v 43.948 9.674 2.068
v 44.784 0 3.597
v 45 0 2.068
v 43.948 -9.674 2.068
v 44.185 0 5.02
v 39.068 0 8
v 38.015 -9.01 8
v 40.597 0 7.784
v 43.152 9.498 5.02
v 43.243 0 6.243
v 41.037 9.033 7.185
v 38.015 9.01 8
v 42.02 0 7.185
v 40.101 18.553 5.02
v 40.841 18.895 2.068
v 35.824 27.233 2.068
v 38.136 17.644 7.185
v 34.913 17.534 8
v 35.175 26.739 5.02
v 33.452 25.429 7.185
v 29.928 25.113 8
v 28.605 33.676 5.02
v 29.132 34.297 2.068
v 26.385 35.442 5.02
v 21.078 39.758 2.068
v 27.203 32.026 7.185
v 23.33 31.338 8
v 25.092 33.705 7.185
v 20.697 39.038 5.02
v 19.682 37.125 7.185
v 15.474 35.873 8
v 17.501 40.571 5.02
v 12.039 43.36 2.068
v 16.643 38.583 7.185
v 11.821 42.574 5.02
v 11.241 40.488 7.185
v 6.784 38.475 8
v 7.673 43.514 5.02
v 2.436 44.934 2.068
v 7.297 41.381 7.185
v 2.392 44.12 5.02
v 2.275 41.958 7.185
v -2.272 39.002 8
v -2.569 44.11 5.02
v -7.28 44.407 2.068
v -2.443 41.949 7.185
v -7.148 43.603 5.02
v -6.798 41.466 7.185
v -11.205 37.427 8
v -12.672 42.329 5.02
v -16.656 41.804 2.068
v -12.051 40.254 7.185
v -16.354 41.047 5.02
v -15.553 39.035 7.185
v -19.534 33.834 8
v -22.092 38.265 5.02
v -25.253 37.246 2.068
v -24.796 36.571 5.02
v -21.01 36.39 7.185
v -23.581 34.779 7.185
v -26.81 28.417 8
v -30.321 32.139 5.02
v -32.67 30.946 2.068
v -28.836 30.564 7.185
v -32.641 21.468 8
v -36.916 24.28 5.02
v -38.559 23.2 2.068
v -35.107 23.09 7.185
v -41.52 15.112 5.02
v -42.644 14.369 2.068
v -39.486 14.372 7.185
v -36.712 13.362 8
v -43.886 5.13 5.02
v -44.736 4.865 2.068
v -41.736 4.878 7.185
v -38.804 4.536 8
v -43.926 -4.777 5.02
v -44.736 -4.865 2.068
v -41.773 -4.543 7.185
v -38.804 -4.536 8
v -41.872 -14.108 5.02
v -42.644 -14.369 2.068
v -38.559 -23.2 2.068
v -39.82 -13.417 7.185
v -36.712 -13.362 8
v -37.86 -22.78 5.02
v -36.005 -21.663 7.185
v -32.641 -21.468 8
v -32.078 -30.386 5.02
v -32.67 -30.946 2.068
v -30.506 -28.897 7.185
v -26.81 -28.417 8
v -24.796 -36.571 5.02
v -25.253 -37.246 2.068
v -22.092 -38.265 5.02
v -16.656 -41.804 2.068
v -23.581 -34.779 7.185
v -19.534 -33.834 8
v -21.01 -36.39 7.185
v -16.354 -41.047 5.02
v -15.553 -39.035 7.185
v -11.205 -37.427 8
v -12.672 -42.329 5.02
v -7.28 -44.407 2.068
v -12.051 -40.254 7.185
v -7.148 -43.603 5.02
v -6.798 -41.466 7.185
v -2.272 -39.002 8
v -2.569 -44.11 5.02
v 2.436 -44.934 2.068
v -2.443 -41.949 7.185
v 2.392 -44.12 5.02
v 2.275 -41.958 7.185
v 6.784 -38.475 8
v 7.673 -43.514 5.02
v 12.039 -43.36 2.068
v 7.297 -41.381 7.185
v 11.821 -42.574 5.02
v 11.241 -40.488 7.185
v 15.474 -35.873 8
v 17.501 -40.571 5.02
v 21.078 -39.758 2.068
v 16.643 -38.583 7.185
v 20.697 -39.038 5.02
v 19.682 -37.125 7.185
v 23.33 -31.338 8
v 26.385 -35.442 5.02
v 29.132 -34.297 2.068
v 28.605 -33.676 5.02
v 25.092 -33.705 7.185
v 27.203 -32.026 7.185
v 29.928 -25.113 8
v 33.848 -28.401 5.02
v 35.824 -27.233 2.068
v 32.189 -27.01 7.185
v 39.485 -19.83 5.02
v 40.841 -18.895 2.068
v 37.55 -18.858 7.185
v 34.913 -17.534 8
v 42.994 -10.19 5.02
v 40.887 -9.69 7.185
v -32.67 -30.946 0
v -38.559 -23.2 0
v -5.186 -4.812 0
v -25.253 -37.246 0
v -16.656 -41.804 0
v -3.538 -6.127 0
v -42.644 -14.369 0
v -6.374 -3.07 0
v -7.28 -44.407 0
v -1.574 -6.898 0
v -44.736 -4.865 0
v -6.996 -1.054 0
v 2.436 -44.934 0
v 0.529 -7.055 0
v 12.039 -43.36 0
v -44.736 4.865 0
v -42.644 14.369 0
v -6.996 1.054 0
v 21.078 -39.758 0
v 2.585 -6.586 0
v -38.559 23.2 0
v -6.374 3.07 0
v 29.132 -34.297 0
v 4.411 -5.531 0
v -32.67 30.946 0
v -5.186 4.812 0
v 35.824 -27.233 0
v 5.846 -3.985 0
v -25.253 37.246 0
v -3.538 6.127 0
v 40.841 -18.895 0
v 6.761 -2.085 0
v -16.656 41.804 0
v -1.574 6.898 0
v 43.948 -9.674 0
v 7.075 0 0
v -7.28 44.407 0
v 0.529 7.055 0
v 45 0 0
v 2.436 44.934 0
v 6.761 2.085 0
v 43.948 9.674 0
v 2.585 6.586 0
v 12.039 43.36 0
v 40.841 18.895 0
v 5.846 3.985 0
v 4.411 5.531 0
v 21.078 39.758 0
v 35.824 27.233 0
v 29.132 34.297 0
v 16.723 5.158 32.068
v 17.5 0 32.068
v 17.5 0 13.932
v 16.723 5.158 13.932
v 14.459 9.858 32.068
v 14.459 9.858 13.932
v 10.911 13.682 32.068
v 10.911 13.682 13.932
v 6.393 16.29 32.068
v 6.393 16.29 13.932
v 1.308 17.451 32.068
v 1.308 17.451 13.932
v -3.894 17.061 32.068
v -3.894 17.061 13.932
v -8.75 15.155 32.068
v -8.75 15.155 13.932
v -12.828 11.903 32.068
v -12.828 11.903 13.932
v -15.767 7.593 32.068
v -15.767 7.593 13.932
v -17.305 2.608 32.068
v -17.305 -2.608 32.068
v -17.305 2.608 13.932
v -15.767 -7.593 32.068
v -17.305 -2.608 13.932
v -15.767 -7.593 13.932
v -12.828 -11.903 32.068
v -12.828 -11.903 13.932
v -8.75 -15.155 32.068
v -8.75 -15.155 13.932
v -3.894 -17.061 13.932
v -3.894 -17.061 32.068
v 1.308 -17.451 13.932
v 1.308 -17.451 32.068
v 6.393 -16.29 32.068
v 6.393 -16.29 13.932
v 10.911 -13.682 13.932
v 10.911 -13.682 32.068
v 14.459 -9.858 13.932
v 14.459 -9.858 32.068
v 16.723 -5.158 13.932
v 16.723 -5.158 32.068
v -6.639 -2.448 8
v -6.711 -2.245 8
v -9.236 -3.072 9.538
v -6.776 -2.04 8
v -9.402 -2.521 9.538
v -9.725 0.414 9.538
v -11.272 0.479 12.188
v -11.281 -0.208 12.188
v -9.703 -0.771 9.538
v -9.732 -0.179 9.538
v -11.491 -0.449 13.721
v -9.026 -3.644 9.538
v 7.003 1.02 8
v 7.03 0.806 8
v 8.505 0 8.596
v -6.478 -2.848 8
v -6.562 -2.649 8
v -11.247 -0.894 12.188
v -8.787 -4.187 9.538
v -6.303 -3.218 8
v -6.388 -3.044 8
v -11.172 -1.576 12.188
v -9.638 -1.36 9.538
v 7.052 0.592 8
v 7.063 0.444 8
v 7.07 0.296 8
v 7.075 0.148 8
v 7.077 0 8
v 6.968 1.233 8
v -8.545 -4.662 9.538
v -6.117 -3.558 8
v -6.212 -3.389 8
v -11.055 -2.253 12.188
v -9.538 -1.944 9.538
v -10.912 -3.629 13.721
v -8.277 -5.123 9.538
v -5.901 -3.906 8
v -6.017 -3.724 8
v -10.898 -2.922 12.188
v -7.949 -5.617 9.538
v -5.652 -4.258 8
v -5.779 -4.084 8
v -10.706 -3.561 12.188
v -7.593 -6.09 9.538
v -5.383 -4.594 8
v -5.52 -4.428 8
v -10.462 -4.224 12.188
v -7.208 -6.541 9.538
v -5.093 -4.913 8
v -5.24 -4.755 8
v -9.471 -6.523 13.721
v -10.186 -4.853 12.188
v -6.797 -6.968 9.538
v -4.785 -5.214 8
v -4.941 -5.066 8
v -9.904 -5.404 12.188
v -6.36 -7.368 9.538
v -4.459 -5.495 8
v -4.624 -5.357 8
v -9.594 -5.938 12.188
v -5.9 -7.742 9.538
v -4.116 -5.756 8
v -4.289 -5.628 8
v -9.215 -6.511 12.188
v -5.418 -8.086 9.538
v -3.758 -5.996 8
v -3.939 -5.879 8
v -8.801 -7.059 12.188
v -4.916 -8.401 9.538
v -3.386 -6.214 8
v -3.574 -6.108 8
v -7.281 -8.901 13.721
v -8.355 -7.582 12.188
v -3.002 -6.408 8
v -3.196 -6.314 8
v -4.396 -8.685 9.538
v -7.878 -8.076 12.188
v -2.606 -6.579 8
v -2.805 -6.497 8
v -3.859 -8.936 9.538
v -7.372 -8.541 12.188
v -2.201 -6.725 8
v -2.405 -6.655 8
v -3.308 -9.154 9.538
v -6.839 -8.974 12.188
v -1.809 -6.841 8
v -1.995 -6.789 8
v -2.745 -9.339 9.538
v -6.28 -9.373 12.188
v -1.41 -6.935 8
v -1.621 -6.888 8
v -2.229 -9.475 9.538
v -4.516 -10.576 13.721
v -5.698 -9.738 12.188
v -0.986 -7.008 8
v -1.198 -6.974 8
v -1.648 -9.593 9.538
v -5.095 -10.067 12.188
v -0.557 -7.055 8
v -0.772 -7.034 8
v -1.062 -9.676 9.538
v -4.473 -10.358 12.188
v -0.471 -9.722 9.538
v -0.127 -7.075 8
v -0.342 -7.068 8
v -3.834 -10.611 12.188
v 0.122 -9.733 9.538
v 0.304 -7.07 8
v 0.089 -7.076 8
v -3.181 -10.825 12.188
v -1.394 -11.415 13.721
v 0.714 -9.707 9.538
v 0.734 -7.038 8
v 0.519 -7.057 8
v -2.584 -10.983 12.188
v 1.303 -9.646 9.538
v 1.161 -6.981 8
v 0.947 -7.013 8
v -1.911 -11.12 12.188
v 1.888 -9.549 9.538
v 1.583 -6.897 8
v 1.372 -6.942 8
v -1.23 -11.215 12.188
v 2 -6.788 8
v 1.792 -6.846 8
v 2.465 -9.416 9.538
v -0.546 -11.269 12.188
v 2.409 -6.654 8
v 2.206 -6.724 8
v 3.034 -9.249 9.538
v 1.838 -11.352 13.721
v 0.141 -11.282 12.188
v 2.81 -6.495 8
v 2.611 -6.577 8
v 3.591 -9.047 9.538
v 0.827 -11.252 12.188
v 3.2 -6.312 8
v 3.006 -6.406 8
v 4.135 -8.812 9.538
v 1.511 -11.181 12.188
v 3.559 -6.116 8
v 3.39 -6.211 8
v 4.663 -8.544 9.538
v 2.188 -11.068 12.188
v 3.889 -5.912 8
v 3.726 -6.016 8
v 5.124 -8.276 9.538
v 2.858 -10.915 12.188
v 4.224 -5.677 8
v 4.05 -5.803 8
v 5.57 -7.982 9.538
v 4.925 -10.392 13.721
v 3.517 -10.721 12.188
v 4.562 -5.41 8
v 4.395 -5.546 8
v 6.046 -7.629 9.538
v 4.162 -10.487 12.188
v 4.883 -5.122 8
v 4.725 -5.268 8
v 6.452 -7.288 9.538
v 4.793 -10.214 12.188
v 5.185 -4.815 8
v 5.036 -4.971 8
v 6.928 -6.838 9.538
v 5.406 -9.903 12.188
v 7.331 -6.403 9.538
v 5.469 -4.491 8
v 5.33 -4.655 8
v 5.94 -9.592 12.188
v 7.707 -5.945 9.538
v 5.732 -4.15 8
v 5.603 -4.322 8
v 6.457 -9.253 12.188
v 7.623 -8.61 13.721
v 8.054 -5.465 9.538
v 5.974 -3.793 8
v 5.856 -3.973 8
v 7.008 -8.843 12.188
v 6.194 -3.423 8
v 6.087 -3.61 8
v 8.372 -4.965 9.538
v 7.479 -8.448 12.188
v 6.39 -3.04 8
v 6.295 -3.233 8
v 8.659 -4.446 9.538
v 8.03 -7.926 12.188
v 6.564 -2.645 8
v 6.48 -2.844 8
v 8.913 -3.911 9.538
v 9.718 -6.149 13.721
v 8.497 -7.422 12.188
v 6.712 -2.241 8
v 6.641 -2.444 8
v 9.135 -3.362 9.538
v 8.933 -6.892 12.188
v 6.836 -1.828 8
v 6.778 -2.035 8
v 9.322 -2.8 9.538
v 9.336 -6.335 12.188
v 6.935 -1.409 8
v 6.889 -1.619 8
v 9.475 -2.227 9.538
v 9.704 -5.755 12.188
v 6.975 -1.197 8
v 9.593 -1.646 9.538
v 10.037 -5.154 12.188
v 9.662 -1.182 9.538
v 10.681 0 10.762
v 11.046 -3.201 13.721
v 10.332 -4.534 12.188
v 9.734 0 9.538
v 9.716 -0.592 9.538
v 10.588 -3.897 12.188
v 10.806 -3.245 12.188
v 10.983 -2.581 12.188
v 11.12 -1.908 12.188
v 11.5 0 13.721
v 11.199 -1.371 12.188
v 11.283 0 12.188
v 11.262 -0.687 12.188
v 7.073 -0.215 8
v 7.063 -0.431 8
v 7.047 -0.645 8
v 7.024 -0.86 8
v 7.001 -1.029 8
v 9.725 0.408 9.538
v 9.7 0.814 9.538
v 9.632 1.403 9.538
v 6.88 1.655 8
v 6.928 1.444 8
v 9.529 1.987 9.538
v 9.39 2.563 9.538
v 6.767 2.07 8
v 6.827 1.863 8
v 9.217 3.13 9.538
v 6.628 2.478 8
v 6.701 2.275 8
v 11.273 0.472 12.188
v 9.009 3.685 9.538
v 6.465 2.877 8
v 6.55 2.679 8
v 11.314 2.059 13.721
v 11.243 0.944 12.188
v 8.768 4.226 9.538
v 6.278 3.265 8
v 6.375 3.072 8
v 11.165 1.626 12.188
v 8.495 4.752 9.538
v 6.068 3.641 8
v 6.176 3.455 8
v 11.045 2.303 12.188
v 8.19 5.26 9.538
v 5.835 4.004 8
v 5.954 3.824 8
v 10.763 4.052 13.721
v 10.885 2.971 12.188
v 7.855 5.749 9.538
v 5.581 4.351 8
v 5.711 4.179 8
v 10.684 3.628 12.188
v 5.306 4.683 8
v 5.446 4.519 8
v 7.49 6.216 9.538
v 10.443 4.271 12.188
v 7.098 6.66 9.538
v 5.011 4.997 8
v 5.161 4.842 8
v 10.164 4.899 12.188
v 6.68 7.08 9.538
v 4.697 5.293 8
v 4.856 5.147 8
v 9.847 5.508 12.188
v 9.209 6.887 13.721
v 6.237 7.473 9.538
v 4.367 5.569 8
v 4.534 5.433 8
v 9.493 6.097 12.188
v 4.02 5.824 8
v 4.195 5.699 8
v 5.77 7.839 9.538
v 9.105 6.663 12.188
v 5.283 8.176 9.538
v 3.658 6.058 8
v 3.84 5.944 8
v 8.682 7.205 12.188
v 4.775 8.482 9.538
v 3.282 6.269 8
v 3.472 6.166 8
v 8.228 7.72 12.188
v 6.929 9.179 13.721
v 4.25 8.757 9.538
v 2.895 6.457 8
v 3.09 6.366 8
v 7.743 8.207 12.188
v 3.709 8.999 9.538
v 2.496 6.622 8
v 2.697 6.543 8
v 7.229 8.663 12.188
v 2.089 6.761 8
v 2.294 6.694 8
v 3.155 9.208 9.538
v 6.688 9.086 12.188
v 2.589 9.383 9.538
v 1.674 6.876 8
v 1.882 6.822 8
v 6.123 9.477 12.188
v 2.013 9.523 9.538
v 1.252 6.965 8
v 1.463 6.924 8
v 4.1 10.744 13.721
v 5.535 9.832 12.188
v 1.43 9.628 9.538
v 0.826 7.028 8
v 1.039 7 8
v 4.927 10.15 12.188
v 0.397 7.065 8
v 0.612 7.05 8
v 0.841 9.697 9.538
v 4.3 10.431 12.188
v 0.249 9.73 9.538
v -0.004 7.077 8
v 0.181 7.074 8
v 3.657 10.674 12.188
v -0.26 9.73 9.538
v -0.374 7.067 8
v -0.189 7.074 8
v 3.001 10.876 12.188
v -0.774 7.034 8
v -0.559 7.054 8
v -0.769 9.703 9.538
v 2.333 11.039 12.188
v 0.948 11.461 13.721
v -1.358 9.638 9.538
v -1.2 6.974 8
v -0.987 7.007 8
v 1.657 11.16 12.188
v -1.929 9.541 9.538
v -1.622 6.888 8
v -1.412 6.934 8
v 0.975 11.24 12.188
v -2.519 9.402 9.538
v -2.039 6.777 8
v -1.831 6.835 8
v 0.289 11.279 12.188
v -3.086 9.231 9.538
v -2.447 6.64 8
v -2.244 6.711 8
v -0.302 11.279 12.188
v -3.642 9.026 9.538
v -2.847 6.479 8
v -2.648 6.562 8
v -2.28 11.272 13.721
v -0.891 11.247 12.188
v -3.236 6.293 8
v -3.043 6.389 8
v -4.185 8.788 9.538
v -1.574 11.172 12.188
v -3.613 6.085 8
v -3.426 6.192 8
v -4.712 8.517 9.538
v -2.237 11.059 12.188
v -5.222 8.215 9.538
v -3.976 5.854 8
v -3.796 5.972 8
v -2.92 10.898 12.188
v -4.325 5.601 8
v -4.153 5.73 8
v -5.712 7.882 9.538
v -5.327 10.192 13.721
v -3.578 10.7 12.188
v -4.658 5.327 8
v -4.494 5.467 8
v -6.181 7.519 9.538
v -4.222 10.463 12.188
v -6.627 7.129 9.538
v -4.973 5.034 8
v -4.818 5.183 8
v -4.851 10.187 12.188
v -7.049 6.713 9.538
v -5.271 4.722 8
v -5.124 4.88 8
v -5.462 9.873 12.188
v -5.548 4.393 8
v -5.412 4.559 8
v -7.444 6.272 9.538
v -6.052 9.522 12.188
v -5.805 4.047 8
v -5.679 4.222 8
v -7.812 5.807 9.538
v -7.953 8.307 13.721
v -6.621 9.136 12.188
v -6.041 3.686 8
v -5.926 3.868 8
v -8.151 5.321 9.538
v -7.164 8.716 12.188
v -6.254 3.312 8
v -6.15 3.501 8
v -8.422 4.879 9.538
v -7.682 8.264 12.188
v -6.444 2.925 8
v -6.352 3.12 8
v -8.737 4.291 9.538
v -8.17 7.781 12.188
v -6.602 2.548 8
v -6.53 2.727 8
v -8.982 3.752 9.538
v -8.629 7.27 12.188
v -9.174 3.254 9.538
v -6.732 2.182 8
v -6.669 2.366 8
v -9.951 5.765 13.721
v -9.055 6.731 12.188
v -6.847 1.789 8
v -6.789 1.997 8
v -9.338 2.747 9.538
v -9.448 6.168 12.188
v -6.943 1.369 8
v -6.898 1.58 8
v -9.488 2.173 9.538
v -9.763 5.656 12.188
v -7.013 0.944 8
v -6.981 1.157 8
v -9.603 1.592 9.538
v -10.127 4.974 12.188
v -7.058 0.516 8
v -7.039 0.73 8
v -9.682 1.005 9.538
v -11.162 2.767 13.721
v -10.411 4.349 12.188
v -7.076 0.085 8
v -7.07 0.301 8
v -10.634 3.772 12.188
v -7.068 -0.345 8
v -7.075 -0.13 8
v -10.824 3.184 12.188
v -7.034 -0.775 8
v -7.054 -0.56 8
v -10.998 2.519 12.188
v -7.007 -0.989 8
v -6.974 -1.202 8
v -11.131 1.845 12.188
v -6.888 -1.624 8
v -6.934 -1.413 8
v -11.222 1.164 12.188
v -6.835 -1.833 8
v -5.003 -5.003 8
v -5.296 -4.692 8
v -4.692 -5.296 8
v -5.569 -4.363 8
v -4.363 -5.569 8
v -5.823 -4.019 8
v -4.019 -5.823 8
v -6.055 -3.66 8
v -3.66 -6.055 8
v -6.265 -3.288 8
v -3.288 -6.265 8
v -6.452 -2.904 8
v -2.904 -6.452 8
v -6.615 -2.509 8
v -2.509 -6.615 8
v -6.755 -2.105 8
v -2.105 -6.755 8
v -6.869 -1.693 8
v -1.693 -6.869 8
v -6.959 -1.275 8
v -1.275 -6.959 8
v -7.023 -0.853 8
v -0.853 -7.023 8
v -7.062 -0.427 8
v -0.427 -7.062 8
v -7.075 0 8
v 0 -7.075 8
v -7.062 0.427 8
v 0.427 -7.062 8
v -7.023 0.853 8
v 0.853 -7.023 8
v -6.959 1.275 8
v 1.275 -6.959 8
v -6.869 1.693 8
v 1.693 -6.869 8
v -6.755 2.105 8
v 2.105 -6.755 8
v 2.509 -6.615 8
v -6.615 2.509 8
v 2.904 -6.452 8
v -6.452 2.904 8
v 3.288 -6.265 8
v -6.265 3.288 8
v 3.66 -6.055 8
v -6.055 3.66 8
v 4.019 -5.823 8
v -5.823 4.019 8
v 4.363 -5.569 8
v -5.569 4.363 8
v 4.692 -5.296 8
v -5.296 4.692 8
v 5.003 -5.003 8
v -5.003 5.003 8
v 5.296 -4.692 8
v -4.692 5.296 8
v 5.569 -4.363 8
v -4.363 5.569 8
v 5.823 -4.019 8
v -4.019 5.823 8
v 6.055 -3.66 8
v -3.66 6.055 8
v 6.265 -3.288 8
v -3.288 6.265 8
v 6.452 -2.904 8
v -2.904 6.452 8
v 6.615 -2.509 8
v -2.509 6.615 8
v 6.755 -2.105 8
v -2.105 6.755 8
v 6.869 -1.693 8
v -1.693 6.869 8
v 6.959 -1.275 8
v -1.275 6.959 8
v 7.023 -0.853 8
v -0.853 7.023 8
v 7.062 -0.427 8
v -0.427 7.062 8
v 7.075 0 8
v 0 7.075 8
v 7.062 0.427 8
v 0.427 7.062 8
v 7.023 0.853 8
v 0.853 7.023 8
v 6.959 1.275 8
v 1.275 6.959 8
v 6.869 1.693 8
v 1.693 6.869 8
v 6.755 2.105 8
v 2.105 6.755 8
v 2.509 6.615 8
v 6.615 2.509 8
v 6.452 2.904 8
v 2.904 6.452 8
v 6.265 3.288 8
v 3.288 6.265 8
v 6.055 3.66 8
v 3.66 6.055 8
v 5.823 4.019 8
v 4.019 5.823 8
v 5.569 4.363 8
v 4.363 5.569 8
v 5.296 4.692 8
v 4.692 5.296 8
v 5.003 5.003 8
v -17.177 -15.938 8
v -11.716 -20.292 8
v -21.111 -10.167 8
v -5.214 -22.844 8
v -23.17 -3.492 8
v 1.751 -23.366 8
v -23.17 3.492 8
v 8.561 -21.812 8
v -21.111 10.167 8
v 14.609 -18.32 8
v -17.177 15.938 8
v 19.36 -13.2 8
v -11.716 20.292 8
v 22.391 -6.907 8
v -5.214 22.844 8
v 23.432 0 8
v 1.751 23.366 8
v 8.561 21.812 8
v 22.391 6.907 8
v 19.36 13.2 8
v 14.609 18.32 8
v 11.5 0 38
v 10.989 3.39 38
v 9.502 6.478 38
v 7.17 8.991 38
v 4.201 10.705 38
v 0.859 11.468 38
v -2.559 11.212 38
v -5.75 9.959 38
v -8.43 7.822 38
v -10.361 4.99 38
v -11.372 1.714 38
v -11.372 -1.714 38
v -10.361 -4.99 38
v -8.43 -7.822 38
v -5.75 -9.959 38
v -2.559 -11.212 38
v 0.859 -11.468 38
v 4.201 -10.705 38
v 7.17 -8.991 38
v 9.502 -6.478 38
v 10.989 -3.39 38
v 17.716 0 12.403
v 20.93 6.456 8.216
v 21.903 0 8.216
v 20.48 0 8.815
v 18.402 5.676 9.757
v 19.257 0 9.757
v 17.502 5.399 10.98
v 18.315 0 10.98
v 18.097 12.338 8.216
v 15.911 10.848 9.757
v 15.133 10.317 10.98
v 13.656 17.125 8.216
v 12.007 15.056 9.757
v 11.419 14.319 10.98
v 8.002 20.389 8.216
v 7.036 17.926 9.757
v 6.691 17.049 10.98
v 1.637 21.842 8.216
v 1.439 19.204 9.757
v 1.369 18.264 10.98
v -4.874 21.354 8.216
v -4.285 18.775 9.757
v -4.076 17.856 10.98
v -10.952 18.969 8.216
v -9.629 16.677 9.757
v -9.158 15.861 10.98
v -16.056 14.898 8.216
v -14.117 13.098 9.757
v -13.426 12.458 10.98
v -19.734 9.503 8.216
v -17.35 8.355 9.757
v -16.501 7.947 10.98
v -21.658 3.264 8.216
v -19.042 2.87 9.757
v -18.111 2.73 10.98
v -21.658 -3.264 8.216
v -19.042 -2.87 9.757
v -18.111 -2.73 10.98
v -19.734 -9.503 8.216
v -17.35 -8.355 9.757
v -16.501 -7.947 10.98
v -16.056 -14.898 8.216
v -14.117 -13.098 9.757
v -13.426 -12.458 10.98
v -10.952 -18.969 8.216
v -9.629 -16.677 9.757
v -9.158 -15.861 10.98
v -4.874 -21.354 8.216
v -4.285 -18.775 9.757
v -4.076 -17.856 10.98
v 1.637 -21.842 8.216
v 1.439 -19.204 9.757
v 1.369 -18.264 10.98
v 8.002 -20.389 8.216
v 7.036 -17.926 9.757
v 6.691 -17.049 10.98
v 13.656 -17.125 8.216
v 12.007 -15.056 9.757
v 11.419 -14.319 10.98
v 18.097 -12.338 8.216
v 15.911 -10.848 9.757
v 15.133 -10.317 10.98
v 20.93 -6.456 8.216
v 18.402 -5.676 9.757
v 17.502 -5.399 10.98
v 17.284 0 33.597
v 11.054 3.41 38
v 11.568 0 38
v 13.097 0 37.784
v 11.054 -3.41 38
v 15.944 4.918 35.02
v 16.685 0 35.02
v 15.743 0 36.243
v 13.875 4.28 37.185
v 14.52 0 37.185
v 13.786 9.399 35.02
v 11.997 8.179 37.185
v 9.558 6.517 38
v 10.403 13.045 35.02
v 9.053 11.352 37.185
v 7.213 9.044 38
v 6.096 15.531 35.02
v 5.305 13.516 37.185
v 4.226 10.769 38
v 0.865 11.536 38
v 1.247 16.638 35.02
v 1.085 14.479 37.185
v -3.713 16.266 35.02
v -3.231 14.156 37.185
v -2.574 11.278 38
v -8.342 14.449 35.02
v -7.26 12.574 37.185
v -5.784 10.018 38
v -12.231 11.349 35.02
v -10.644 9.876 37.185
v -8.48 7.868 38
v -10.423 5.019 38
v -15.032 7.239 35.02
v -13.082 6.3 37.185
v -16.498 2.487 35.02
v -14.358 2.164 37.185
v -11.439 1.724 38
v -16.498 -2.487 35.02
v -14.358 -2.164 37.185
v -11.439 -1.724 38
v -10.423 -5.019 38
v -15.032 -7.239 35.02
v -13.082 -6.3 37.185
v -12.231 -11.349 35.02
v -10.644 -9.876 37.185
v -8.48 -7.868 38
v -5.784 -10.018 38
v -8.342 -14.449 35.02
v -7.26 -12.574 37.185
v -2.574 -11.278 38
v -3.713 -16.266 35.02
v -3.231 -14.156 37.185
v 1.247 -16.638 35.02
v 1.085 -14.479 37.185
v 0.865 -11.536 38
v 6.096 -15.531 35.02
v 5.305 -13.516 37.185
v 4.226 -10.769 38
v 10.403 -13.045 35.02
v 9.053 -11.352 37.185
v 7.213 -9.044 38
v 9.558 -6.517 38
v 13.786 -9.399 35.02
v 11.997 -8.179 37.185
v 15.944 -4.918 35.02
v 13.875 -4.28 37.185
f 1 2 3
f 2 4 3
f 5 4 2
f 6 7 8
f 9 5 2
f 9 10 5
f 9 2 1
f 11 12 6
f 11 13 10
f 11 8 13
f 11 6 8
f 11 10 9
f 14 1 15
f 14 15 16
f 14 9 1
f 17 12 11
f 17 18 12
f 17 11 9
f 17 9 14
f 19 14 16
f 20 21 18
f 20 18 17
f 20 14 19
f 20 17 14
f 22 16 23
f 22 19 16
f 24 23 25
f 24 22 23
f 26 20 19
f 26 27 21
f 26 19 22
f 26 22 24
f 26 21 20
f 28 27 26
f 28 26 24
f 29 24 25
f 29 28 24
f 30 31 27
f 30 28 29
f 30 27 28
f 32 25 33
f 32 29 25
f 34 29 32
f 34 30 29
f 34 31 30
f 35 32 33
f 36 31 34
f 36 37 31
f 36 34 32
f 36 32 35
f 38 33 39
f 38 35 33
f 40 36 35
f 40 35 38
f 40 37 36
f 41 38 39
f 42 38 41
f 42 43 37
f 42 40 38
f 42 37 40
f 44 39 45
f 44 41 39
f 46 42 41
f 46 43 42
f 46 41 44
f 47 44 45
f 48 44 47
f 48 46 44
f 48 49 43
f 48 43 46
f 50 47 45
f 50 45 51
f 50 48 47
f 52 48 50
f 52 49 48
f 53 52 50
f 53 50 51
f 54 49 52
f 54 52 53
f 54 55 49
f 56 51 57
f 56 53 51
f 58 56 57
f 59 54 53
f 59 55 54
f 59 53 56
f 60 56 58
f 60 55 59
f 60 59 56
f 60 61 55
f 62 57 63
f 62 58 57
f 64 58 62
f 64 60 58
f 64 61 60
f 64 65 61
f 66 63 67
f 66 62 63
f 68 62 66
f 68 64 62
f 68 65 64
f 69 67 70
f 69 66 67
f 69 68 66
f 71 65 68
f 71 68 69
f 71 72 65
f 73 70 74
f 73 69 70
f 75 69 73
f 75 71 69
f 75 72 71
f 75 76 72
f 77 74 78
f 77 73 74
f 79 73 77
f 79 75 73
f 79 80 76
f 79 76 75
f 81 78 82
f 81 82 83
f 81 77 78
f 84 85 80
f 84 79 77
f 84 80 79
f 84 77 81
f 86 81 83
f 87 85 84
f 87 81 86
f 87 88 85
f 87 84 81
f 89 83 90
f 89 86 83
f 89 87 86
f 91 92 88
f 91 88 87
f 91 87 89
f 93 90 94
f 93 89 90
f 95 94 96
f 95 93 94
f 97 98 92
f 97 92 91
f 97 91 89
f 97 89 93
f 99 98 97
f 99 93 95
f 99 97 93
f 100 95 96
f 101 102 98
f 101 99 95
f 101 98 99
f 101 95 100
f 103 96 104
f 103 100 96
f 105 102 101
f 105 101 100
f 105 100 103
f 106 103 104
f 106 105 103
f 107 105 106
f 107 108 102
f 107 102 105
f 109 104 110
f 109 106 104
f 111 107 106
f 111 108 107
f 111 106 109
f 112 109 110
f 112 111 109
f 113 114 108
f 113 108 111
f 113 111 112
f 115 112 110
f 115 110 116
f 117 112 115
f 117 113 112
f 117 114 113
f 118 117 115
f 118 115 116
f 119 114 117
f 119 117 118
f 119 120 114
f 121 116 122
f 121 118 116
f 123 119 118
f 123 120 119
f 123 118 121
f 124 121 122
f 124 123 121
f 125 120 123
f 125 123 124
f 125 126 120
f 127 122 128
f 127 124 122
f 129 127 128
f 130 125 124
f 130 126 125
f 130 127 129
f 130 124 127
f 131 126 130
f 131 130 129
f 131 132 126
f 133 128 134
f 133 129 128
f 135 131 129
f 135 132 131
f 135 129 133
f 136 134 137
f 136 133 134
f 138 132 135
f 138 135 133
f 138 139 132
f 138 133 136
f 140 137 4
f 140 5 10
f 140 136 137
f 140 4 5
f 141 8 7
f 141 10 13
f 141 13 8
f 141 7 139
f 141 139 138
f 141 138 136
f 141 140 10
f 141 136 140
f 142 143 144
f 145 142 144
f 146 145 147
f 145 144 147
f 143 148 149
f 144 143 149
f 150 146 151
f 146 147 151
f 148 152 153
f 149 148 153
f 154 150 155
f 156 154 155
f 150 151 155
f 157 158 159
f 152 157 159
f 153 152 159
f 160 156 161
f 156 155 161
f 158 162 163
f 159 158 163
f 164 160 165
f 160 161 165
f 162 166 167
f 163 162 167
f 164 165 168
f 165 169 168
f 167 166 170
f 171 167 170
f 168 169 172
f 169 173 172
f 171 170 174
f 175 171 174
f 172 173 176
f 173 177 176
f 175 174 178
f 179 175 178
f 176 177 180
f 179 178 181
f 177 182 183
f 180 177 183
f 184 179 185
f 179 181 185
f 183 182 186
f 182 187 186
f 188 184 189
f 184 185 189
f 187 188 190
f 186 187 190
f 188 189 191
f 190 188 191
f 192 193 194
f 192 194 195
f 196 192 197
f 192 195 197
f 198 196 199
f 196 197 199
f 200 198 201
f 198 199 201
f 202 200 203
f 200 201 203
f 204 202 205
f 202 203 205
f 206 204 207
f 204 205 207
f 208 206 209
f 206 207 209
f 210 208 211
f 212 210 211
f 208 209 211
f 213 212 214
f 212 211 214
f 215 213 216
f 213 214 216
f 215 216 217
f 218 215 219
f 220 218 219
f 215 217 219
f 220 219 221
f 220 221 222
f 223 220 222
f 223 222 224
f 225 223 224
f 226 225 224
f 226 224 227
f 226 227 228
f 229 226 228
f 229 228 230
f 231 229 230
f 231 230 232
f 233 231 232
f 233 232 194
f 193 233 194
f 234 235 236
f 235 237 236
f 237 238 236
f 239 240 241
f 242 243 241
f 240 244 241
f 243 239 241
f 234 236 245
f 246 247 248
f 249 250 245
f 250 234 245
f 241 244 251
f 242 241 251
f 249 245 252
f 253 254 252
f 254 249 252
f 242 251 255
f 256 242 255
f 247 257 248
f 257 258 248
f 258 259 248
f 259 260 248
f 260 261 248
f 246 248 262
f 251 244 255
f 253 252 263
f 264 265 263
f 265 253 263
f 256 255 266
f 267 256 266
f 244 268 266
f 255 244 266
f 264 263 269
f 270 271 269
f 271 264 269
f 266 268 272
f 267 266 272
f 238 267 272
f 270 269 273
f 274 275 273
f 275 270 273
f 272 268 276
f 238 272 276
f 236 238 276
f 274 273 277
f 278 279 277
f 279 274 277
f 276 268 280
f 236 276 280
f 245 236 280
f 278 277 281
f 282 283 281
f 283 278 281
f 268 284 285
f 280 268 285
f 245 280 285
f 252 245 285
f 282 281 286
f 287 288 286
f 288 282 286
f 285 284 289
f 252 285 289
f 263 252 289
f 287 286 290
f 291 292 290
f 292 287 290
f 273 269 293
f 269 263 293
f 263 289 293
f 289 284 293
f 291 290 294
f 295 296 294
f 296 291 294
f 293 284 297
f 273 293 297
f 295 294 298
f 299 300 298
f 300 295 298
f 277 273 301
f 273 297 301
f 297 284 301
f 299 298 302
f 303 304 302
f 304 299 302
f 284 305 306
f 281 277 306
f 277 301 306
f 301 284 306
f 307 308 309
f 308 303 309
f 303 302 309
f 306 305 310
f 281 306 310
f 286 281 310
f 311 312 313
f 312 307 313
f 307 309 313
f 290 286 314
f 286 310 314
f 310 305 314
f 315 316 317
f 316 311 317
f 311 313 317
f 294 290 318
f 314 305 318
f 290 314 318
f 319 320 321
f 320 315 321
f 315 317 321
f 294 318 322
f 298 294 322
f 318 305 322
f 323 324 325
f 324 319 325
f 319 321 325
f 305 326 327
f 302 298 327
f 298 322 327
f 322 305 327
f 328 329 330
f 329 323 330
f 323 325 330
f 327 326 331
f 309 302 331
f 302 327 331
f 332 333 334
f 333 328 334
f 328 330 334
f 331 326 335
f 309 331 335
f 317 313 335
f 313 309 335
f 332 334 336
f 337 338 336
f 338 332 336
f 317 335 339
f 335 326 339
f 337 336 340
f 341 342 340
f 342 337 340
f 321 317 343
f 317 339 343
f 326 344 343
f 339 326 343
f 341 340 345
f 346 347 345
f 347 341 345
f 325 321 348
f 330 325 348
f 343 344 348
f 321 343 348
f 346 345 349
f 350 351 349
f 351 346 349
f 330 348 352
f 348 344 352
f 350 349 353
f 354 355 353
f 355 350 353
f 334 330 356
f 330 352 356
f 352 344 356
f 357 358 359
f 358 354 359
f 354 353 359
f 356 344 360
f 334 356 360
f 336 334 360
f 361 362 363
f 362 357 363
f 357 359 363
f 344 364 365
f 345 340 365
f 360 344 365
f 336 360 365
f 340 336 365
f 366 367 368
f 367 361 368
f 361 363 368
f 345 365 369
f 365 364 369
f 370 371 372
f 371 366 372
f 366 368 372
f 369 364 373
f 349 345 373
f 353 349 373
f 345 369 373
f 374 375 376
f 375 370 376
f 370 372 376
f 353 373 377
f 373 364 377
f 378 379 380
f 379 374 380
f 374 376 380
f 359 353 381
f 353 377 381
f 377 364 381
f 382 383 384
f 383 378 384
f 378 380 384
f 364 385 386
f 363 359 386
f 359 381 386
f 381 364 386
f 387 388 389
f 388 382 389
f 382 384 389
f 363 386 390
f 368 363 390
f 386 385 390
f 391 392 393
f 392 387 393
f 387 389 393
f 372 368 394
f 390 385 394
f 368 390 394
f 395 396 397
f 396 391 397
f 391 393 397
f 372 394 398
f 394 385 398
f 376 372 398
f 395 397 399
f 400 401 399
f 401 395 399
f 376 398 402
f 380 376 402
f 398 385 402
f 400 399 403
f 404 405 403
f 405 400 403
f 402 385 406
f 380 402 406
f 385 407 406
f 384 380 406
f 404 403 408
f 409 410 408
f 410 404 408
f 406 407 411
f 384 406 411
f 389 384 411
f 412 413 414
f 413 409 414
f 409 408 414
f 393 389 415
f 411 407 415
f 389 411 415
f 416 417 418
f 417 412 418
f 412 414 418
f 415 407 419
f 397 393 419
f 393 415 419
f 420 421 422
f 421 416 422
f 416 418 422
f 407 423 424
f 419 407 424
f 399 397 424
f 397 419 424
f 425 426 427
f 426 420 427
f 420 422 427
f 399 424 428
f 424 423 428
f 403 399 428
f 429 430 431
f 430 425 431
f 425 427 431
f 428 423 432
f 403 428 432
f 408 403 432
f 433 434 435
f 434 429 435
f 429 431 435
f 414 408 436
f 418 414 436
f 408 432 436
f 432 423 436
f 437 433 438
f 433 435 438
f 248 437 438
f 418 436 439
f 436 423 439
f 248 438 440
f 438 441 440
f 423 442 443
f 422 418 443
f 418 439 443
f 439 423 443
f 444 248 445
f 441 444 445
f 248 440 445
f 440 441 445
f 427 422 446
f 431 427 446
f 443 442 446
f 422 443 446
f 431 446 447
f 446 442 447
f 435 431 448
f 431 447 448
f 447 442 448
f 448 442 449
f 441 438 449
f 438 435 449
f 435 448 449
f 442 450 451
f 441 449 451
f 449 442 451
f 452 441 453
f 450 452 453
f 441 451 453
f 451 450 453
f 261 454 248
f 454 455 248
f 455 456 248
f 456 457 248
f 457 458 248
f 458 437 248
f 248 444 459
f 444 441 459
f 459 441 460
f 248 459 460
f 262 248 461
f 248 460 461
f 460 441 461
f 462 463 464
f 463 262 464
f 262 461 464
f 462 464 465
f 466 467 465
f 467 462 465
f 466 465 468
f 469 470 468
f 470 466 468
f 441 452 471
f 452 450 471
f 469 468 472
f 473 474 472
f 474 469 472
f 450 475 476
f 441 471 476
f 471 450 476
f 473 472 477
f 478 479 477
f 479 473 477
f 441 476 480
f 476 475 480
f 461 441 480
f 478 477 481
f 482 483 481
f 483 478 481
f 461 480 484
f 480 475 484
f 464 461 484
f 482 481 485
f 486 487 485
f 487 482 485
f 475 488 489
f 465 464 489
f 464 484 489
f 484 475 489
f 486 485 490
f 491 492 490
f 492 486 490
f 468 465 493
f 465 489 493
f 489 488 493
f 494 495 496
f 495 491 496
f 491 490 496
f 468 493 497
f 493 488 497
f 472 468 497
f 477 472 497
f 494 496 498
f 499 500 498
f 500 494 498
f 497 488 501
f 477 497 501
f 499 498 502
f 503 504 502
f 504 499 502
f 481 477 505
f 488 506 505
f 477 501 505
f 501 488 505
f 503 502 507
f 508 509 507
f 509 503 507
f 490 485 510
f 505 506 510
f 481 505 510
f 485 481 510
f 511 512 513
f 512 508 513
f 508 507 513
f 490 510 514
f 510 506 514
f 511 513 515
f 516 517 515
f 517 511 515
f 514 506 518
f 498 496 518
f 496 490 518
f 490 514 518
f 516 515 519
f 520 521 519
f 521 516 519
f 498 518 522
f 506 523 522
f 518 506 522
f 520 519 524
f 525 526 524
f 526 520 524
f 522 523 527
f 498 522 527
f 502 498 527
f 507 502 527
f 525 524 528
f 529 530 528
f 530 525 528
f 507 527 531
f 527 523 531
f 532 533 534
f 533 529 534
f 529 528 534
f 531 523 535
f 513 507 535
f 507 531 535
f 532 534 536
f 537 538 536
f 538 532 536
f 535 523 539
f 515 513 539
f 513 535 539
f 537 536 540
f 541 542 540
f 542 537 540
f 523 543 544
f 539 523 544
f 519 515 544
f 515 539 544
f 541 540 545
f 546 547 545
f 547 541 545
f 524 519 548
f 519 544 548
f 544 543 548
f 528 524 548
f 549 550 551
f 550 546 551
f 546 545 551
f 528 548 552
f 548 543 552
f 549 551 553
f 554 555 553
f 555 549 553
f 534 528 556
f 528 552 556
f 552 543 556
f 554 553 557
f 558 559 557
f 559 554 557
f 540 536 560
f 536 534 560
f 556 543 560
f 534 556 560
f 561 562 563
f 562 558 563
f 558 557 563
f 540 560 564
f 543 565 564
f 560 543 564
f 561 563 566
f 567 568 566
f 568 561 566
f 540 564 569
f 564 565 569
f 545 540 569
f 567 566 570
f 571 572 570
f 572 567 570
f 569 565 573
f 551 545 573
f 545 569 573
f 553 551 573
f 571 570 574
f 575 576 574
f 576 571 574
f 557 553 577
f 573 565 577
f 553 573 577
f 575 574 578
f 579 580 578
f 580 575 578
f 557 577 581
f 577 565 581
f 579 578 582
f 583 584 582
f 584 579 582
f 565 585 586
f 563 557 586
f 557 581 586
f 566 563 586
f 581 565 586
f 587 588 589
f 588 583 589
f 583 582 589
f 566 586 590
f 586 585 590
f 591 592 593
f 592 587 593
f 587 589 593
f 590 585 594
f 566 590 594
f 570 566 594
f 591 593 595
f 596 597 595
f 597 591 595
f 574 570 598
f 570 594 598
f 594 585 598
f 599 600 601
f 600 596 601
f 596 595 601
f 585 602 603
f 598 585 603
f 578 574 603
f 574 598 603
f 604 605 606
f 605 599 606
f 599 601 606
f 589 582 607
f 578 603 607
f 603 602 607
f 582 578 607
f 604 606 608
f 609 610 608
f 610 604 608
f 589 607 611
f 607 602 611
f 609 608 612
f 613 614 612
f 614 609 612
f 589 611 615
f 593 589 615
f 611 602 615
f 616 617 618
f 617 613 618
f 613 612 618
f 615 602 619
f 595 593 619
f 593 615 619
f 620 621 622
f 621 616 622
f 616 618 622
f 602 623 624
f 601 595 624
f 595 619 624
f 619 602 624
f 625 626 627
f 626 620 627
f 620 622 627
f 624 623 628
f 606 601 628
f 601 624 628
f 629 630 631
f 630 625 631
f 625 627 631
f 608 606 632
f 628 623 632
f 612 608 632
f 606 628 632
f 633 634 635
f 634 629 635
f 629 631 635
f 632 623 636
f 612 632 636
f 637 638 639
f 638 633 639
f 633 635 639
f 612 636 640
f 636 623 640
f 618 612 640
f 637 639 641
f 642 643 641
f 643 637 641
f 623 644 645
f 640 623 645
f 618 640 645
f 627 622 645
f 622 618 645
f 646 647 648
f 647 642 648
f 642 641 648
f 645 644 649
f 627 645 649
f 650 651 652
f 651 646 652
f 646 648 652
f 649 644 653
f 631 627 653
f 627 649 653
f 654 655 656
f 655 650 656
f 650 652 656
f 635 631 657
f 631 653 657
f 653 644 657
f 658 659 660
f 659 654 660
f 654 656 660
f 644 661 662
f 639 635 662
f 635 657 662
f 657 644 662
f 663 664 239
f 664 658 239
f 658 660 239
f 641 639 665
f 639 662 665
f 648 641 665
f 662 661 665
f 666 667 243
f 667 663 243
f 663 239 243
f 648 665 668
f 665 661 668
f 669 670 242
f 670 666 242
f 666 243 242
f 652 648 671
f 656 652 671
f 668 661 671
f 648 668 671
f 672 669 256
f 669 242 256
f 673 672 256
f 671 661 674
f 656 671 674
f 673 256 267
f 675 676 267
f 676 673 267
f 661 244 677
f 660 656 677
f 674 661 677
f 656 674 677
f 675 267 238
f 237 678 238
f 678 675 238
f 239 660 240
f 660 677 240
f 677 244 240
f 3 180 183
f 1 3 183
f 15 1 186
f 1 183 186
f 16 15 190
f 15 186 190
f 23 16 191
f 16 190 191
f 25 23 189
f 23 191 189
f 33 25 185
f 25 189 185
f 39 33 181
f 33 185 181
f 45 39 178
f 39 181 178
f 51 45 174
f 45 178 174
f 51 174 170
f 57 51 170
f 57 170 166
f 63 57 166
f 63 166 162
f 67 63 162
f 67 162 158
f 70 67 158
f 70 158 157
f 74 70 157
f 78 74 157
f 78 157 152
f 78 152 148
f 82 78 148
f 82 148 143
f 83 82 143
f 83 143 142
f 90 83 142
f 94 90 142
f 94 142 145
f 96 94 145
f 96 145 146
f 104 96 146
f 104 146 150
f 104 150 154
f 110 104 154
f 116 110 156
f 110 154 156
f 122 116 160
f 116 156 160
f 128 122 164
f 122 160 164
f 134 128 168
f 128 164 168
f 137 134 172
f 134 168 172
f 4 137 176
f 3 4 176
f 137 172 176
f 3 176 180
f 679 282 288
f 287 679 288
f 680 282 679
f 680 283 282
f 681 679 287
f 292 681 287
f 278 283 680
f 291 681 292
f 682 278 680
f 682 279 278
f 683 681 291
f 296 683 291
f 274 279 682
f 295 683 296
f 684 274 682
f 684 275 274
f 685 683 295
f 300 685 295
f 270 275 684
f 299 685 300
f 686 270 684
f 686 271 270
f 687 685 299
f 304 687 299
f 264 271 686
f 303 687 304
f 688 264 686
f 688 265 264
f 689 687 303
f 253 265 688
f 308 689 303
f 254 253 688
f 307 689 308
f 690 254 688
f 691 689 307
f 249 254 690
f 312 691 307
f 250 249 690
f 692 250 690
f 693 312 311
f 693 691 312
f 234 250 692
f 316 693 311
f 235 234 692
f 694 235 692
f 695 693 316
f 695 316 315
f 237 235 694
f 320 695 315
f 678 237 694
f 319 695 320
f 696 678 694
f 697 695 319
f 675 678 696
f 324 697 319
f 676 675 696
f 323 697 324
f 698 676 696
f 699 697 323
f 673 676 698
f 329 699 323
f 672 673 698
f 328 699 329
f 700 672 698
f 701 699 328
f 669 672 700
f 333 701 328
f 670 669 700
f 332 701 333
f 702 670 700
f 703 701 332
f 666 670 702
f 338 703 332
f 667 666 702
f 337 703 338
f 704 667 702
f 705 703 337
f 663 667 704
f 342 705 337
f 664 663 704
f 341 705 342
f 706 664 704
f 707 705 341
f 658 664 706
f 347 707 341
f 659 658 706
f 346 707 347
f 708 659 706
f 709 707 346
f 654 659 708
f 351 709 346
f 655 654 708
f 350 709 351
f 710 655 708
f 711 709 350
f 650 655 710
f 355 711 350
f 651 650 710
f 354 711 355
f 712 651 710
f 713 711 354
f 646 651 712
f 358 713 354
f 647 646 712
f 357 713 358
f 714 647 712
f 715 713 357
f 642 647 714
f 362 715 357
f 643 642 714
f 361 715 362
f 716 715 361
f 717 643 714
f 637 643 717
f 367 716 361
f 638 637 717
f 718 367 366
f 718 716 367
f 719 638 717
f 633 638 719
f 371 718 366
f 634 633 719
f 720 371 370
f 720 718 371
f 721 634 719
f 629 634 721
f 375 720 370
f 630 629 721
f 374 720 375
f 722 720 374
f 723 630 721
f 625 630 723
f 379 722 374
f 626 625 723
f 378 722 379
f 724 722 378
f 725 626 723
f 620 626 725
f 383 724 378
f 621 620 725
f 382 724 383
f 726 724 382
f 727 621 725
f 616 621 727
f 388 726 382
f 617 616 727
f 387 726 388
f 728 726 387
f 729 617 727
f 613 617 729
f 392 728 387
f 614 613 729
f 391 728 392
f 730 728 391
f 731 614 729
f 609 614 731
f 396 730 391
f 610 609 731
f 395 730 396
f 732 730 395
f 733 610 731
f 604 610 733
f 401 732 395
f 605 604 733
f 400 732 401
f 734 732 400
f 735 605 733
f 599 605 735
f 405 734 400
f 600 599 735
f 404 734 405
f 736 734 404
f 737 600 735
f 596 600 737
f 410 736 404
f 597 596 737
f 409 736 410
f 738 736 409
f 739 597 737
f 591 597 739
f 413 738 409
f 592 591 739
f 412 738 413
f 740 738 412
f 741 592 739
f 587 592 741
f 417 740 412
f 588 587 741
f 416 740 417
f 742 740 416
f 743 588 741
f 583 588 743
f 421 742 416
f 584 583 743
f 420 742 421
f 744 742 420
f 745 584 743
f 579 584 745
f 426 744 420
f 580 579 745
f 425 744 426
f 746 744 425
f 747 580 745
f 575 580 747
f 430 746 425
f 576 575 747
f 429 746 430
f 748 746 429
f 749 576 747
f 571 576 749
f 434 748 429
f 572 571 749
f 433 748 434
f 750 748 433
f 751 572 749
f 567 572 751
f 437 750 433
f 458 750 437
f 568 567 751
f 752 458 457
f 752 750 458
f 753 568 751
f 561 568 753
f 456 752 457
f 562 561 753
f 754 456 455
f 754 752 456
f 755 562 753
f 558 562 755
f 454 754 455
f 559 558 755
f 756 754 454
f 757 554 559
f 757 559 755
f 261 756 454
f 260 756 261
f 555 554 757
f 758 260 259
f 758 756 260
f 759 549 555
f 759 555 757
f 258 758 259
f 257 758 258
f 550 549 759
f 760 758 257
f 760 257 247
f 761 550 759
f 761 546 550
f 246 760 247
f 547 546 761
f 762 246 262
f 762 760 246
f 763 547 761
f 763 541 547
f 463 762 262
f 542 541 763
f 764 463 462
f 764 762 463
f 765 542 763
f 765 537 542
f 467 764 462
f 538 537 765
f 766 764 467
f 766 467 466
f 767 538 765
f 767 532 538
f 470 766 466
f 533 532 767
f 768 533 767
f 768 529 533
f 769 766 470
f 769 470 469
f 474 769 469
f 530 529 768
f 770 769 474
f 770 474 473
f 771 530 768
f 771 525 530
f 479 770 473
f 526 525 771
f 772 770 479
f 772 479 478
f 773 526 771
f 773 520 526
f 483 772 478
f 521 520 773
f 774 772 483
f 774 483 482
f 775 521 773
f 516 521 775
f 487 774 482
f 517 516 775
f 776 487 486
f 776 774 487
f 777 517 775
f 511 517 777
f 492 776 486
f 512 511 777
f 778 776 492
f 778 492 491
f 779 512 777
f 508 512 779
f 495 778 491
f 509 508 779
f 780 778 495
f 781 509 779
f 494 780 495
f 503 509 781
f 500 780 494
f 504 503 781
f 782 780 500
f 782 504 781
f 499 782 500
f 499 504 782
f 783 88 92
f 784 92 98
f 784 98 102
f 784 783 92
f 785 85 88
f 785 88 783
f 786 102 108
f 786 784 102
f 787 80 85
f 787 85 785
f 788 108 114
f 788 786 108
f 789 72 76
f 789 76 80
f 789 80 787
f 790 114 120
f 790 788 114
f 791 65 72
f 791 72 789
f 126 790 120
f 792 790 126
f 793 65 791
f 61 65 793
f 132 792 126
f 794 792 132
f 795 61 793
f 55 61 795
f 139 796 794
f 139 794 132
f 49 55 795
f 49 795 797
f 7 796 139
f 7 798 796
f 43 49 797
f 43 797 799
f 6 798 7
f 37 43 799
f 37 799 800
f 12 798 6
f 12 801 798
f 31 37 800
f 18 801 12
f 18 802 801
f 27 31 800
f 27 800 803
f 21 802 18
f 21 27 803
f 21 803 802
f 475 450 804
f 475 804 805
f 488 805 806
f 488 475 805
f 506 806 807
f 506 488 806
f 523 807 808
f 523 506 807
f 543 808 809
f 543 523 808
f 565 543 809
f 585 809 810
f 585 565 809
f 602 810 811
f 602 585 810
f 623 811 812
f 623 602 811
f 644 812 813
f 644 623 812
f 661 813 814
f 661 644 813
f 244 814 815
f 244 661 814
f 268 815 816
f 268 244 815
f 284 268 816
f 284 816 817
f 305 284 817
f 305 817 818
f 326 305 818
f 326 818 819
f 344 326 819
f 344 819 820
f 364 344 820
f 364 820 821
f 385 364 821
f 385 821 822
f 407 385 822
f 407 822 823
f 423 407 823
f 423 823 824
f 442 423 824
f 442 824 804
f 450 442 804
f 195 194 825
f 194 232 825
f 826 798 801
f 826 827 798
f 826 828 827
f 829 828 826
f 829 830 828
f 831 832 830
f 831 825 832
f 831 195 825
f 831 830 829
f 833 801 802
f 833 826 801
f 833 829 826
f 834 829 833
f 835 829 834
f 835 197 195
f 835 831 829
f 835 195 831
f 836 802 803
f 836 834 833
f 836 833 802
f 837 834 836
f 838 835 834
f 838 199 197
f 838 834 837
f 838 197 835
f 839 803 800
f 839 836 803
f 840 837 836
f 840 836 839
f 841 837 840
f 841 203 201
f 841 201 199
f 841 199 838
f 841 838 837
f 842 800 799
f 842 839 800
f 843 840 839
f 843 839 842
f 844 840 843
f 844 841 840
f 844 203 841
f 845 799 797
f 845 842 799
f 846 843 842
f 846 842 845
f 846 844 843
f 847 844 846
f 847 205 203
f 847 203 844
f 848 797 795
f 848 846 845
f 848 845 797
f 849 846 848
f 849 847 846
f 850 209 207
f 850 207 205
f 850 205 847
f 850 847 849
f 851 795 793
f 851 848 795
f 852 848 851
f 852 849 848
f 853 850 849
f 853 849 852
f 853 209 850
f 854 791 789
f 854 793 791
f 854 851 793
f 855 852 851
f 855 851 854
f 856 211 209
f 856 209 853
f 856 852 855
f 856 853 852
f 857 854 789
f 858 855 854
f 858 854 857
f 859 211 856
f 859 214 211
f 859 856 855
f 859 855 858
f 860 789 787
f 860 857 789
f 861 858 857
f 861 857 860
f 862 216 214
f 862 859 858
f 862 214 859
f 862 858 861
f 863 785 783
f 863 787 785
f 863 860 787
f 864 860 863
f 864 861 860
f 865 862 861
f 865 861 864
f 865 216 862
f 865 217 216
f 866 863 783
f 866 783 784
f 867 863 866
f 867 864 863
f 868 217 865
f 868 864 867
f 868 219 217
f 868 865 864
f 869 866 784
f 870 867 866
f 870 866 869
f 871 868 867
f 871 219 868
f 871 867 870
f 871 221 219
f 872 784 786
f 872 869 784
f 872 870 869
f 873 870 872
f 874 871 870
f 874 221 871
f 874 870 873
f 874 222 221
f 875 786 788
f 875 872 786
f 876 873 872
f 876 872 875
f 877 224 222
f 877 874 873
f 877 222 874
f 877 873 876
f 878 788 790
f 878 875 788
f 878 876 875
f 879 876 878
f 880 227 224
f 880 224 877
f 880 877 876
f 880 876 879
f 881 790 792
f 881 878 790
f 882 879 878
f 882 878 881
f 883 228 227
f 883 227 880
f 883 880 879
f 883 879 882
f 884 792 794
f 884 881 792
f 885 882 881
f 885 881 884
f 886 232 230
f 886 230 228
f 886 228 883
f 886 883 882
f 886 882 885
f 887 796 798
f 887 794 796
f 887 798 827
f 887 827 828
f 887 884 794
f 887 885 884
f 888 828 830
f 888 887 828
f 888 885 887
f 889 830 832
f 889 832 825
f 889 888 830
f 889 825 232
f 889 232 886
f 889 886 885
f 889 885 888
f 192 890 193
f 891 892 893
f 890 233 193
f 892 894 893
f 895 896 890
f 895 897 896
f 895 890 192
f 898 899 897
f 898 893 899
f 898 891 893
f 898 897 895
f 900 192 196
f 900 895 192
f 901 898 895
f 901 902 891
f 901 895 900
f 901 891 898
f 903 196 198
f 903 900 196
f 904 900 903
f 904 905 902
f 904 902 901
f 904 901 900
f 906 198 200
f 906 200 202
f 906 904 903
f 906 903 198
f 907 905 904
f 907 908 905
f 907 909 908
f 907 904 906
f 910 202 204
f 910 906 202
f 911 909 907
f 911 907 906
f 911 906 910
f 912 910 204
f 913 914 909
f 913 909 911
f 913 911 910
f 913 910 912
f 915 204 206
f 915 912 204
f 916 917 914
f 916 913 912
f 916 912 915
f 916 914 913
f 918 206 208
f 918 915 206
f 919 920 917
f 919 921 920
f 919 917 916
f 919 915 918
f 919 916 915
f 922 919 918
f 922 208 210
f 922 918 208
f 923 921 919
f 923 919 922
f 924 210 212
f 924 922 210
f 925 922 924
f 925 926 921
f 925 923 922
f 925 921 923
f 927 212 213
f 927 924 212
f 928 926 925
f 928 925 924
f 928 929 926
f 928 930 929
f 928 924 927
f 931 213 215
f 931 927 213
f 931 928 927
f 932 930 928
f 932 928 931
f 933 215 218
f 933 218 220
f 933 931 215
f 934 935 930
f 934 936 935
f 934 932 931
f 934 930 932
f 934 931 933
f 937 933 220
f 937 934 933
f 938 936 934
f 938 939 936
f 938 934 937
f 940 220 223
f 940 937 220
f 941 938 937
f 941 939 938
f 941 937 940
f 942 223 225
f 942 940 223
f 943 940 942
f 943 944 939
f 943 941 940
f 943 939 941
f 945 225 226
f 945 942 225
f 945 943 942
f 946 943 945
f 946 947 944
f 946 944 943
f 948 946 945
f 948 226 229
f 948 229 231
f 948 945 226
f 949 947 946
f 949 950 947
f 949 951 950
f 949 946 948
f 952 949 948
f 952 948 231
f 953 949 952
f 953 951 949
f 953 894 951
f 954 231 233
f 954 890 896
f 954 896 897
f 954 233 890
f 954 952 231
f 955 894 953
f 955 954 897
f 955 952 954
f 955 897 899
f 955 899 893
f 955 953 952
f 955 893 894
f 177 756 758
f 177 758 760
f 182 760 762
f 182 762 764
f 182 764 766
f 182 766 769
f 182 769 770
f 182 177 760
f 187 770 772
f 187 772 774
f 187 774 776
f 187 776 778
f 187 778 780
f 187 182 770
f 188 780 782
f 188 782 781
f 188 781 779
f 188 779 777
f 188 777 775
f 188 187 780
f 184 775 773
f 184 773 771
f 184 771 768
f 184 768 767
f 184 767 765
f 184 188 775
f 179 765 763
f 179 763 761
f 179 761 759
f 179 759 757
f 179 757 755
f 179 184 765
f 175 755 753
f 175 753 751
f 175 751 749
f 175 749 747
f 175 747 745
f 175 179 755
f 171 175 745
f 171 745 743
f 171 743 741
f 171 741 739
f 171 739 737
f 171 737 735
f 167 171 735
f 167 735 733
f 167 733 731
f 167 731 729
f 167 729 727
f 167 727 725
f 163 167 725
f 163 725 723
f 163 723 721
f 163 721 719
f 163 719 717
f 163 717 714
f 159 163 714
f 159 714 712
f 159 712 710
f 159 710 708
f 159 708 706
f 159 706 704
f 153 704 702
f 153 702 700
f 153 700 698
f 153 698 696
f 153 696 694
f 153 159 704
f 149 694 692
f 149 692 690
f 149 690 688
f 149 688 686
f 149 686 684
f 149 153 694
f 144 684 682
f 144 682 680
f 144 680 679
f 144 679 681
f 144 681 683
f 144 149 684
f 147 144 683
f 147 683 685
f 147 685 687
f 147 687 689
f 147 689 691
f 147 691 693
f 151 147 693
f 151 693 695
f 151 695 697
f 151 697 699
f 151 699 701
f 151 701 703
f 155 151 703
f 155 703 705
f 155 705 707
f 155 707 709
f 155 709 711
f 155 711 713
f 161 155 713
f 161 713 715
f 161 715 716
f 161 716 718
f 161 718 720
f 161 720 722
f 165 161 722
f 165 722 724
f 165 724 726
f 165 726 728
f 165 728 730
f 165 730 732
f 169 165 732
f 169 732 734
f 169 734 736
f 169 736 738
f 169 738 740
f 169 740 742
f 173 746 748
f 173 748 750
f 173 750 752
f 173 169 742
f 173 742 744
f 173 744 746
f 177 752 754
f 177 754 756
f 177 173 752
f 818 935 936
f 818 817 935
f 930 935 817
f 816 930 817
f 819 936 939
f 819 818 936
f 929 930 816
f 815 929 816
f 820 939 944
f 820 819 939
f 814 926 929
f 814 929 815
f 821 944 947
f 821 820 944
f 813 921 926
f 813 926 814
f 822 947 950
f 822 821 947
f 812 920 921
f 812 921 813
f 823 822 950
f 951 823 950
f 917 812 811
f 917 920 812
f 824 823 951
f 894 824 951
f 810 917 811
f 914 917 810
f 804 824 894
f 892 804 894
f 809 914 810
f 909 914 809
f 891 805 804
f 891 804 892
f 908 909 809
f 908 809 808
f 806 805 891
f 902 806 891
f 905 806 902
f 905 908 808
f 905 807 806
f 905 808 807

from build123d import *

# Parameters (mm, degrees)
F0_R     = 45
F0_R_2   = 7.075
F1_DEPTH = 8
F2_R     = 17.5
F2_R_2   = 11.5
F3_DEPTH = 30


# Not quite as in the source:
# - a fillet or chamfer that OpenCascade refuses, or shapes differently, is made with other operations: its cross-section is extruded or revolved along the edge and cut away or added


with BuildPart() as f1:
    # F0 (on Top) → F1 (new body)
    with BuildSketch(Plane.XY):
        Circle(F0_R)
        Circle(F0_R_2, mode=Mode.SUBTRACT)
    extrude(amount=F1_DEPTH)

    # F2 (on face) → F3 (join)
    with BuildSketch(Plane.XY.offset(8)):
        Circle(F2_R)
        Circle(F2_R_2, mode=Mode.SUBTRACT)
    extrude(amount=F3_DEPTH)

    # F4: fillet of radius 6 on 4 edges, made by hand

    # F4_s1 → F4_t2 (revolve)
    with BuildSketch(Plane.XZ):
        with BuildLine():
            ThreePointArc((23.5009656854, 7.9996), (19.2573593129, 9.7573593129), (17.4996, 14.0009656854))
            Line((17.4996, 14.0009656854), (16.8994634315, 14.0009656854))
            ThreePointArc((16.8994634315, 14.0009656854), (16.8998634315, 11.0004828427), (16.8998634315, 8))
            Line((16.8998634315, 8), (17.5, 7.3998634315))
            ThreePointArc((17.5, 7.3998634315), (20.5004828427, 7.3998634315), (23.5009656854, 7.3994634315))
            Line((23.5009656854, 7.3994634315), (23.5009656854, 7.9996))
        make_face()
    revolve(axis=Axis((0, 0, 8), (0, 0, 1)))

    # F4_s3 → F4_t4 (revolve)
    with BuildSketch(Plane.XZ):
        with BuildLine():
            ThreePointArc((7.0751050475, 7.9996140401), (10.2674180504, 10.1463065699), (11.5004, 13.7903299833))
            Line((11.5004, 13.7903299833), (12.1005365685, 13.7903299833))
            ThreePointArc((12.1005365685, 13.7903299833), (12.1001365685, 10.8951649917), (12.1001365685, 8))
            Line((12.1001365685, 8), (11.5, 7.3998634315))
            ThreePointArc((11.5, 7.3998634315), (9.2875525237, 7.3998634315), (7.2327121208, 7.4205424458))
            Line((7.2327121208, 7.4205424458), (7.0751050475, 7.9996140401))
        make_face()
    revolve(axis=Axis((0, 0, 8), (0, 0, 1)))

    # F4_s5 → F4_t6 (revolve, cut)
    with BuildSketch(Plane.XZ):
        with BuildLine():
            ThreePointArc((45.0004, 1.9990343146), (43.2426406871, 6.2426406871), (38.9990343146, 8.0004))
            Line((38.9990343146, 8.0004), (38.9990343146, 8.6005365685))
            ThreePointArc((38.9990343146, 8.6005365685), (41.9995171573, 8.6001365685), (45, 8.6001365685))
            Line((45, 8.6001365685), (45.6001365685, 8))
            ThreePointArc((45.6001365685, 8), (45.6001365685, 4.9995171573), (45.6005365685, 1.9990343146))
            Line((45.6005365685, 1.9990343146), (45.0004, 1.9990343146))
        make_face()
    revolve(axis=Axis((0, 0, 8), (0, 0, 1)), mode=Mode.SUBTRACT)

    # F4_s7 → F4_t8 (revolve, cut)
    with BuildSketch(Plane.XZ):
        with BuildLine():
            ThreePointArc((17.5004, 31.9990343923), (15.7429821175, 36.242299307), (11.5000000644, 38.0004))
            Line((11.5000000644, 38.0004), (11.5000966393, 38.6005365608))
            ThreePointArc((11.5000966393, 38.6005365608), (14.5000000322, 38.6001365685), (17.5, 38.6001365685))
            Line((17.5, 38.6001365685), (18.1001365685, 38))
            ThreePointArc((18.1001365685, 38), (18.1001365685, 34.9995171961), (18.1005365685, 31.9990343923))
            Line((18.1005365685, 31.9990343923), (17.5004, 31.9990343923))
        make_face()
    revolve(axis=Axis((0, 0, 38), (0, 0, 1)), mode=Mode.SUBTRACT)


solid = f1.part
